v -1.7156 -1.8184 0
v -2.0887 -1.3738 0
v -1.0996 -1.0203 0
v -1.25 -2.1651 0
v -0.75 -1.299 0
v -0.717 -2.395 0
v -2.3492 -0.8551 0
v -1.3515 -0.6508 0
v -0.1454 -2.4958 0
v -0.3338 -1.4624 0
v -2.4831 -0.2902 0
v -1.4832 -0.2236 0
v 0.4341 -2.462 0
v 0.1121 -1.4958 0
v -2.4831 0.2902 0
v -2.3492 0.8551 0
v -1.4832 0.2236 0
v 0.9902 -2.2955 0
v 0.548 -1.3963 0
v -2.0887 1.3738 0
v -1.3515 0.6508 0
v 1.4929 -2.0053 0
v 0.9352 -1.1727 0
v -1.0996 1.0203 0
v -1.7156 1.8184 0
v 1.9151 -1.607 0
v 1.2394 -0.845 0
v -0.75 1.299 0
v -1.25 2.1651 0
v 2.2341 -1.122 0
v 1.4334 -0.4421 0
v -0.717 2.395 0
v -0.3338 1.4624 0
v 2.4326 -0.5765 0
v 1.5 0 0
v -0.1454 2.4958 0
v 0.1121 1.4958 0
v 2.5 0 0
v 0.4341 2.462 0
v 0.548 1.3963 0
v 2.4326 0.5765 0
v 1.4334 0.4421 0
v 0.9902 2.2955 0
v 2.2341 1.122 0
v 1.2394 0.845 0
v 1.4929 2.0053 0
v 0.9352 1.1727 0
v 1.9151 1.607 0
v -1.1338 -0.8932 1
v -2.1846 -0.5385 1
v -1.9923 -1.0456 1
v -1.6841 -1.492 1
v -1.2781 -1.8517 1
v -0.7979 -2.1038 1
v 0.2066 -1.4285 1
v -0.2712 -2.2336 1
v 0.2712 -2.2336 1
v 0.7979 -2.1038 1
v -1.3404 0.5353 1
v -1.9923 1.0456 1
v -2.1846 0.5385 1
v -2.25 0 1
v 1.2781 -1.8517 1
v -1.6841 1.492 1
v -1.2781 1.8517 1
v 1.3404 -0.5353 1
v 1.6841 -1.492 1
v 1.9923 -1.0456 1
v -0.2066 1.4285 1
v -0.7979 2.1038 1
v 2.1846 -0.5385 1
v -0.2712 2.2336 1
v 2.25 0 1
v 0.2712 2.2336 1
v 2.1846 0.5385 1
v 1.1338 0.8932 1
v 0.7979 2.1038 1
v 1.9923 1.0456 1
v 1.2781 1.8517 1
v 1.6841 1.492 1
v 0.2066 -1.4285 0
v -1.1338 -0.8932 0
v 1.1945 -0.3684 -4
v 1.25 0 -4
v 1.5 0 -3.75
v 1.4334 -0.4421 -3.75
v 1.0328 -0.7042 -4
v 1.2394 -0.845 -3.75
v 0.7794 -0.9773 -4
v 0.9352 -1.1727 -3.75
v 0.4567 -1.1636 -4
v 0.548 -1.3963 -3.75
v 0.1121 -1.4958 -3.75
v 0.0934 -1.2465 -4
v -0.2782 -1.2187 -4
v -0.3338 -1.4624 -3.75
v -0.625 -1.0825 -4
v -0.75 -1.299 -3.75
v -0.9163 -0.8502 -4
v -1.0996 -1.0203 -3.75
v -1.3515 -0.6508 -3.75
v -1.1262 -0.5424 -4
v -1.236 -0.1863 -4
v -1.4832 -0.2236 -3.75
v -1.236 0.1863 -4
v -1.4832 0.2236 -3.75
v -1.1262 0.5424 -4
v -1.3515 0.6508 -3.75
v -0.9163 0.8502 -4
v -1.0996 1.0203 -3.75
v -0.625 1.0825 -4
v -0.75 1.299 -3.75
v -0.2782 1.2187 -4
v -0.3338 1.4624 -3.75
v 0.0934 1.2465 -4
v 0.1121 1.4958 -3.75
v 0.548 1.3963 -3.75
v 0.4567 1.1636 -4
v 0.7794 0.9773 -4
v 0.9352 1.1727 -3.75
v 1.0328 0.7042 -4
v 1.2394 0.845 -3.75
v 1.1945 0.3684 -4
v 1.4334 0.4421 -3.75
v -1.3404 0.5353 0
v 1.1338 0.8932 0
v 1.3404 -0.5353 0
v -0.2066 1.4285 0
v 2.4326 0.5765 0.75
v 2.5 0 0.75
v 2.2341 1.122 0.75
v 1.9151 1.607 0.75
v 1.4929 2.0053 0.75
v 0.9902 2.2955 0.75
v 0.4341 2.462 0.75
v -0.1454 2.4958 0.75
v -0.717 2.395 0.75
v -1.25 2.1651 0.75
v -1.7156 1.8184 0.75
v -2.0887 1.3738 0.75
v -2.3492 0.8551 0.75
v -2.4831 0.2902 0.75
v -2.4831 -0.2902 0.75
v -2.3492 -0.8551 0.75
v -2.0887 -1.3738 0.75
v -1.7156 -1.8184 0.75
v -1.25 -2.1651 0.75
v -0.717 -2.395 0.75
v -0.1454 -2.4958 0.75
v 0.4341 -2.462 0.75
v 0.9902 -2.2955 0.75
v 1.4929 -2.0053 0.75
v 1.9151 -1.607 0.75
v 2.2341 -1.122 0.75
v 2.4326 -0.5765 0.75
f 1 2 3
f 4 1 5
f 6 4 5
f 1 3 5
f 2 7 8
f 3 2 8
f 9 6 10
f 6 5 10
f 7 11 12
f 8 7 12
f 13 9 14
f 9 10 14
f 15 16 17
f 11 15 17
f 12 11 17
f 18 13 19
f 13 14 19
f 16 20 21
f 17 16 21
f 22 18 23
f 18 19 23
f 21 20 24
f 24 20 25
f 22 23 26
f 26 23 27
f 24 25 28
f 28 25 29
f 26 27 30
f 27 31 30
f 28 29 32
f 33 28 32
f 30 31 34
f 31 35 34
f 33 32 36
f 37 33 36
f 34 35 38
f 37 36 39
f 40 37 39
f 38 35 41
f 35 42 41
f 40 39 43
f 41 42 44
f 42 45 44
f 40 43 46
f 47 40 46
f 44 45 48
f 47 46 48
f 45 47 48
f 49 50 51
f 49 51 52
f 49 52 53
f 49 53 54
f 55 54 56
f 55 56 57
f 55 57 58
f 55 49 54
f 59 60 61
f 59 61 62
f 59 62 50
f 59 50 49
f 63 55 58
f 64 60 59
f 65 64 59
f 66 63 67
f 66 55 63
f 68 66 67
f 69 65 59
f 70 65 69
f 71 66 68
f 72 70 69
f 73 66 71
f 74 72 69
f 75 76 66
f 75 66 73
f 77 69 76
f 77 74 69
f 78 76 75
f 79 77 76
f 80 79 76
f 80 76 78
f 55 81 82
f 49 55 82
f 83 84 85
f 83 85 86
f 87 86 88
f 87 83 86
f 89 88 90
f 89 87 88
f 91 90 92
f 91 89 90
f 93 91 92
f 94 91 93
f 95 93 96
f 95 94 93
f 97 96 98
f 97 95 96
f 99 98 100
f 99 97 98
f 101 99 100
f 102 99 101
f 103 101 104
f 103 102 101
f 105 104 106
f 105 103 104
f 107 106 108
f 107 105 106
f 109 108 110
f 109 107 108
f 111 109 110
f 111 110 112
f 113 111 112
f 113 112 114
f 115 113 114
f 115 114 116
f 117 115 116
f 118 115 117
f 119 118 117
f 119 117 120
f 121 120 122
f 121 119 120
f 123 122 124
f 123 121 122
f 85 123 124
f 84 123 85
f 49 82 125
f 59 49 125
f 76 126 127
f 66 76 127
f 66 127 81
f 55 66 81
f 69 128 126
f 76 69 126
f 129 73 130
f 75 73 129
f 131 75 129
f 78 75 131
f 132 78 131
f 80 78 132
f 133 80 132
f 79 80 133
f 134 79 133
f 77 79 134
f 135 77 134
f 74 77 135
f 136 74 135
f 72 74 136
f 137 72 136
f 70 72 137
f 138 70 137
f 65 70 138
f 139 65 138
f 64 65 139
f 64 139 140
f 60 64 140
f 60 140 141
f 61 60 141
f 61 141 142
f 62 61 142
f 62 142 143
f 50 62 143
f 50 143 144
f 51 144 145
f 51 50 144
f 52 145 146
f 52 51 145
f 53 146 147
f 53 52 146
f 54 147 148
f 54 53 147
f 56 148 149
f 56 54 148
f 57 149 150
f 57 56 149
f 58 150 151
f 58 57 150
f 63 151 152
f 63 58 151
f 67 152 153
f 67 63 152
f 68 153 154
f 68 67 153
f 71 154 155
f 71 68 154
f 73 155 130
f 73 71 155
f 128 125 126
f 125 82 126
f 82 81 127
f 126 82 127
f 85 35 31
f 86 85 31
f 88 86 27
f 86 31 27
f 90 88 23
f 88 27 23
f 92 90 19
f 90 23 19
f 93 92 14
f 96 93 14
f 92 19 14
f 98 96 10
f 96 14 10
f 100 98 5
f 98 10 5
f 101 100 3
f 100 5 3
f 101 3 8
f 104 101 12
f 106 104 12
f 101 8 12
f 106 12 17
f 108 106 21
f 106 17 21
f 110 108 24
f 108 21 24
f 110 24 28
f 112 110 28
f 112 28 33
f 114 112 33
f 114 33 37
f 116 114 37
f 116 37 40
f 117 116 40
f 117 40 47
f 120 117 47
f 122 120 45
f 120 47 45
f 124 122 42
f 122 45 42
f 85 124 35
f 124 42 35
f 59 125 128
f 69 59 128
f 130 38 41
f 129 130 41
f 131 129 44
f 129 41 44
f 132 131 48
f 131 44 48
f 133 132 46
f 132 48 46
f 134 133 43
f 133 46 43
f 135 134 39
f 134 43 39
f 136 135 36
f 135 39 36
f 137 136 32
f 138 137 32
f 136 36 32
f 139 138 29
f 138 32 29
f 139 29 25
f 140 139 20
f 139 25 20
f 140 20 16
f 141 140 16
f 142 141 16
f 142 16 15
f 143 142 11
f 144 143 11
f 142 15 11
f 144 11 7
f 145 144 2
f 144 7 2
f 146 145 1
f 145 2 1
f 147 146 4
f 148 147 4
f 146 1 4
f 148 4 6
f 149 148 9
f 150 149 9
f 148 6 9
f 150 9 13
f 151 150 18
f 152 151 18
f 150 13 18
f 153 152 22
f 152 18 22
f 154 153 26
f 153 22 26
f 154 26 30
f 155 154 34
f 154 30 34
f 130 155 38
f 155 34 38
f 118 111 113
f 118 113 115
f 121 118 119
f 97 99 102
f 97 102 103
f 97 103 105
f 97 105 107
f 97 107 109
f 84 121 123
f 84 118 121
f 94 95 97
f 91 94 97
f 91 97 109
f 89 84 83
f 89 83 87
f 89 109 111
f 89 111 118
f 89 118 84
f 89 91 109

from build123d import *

# Parameters (mm, degrees)
F0_R     = 2.5
F1_DEPTH = 1
F2_R     = 1.5
F3_DEPTH = 4
F4_SIZE  = 0.25
F5_SIZE  = 0.25


with BuildPart() as f1:
    # F0 (on Top) → F1 (new body)
    with BuildSketch(Plane.XY):
        Circle(F0_R)
        Polygon((1.133814, 0.893196), (1.340438, -0.535313), (0.206624, -1.42851), (-1.133814, -0.893196), (-1.340438, 0.535313), (-0.206624, 1.42851), align=None, mode=Mode.SUBTRACT)
    extrude(amount=F1_DEPTH)

    # F2 (on face) → F3 (join)
    with BuildSketch(Plane(origin=(0, 0, 0), x_dir=(1, 0, 0), z_dir=(0, 0, -1))):
        Circle(F2_R)
    extrude(amount=F3_DEPTH)

    # F4
    f4_edges = [f1.edges().sort_by_distance(p)[0] for p in [
        (-2.5, 0, 1),
    ]]
    chamfer(f4_edges, length=F4_SIZE)

    # F5
    f5_edges = [f1.edges().sort_by_distance(p)[0] for p in [
        (-1.5, 0, -4),
    ]]
    chamfer(f5_edges, length=F5_SIZE)


solid = f1.part
